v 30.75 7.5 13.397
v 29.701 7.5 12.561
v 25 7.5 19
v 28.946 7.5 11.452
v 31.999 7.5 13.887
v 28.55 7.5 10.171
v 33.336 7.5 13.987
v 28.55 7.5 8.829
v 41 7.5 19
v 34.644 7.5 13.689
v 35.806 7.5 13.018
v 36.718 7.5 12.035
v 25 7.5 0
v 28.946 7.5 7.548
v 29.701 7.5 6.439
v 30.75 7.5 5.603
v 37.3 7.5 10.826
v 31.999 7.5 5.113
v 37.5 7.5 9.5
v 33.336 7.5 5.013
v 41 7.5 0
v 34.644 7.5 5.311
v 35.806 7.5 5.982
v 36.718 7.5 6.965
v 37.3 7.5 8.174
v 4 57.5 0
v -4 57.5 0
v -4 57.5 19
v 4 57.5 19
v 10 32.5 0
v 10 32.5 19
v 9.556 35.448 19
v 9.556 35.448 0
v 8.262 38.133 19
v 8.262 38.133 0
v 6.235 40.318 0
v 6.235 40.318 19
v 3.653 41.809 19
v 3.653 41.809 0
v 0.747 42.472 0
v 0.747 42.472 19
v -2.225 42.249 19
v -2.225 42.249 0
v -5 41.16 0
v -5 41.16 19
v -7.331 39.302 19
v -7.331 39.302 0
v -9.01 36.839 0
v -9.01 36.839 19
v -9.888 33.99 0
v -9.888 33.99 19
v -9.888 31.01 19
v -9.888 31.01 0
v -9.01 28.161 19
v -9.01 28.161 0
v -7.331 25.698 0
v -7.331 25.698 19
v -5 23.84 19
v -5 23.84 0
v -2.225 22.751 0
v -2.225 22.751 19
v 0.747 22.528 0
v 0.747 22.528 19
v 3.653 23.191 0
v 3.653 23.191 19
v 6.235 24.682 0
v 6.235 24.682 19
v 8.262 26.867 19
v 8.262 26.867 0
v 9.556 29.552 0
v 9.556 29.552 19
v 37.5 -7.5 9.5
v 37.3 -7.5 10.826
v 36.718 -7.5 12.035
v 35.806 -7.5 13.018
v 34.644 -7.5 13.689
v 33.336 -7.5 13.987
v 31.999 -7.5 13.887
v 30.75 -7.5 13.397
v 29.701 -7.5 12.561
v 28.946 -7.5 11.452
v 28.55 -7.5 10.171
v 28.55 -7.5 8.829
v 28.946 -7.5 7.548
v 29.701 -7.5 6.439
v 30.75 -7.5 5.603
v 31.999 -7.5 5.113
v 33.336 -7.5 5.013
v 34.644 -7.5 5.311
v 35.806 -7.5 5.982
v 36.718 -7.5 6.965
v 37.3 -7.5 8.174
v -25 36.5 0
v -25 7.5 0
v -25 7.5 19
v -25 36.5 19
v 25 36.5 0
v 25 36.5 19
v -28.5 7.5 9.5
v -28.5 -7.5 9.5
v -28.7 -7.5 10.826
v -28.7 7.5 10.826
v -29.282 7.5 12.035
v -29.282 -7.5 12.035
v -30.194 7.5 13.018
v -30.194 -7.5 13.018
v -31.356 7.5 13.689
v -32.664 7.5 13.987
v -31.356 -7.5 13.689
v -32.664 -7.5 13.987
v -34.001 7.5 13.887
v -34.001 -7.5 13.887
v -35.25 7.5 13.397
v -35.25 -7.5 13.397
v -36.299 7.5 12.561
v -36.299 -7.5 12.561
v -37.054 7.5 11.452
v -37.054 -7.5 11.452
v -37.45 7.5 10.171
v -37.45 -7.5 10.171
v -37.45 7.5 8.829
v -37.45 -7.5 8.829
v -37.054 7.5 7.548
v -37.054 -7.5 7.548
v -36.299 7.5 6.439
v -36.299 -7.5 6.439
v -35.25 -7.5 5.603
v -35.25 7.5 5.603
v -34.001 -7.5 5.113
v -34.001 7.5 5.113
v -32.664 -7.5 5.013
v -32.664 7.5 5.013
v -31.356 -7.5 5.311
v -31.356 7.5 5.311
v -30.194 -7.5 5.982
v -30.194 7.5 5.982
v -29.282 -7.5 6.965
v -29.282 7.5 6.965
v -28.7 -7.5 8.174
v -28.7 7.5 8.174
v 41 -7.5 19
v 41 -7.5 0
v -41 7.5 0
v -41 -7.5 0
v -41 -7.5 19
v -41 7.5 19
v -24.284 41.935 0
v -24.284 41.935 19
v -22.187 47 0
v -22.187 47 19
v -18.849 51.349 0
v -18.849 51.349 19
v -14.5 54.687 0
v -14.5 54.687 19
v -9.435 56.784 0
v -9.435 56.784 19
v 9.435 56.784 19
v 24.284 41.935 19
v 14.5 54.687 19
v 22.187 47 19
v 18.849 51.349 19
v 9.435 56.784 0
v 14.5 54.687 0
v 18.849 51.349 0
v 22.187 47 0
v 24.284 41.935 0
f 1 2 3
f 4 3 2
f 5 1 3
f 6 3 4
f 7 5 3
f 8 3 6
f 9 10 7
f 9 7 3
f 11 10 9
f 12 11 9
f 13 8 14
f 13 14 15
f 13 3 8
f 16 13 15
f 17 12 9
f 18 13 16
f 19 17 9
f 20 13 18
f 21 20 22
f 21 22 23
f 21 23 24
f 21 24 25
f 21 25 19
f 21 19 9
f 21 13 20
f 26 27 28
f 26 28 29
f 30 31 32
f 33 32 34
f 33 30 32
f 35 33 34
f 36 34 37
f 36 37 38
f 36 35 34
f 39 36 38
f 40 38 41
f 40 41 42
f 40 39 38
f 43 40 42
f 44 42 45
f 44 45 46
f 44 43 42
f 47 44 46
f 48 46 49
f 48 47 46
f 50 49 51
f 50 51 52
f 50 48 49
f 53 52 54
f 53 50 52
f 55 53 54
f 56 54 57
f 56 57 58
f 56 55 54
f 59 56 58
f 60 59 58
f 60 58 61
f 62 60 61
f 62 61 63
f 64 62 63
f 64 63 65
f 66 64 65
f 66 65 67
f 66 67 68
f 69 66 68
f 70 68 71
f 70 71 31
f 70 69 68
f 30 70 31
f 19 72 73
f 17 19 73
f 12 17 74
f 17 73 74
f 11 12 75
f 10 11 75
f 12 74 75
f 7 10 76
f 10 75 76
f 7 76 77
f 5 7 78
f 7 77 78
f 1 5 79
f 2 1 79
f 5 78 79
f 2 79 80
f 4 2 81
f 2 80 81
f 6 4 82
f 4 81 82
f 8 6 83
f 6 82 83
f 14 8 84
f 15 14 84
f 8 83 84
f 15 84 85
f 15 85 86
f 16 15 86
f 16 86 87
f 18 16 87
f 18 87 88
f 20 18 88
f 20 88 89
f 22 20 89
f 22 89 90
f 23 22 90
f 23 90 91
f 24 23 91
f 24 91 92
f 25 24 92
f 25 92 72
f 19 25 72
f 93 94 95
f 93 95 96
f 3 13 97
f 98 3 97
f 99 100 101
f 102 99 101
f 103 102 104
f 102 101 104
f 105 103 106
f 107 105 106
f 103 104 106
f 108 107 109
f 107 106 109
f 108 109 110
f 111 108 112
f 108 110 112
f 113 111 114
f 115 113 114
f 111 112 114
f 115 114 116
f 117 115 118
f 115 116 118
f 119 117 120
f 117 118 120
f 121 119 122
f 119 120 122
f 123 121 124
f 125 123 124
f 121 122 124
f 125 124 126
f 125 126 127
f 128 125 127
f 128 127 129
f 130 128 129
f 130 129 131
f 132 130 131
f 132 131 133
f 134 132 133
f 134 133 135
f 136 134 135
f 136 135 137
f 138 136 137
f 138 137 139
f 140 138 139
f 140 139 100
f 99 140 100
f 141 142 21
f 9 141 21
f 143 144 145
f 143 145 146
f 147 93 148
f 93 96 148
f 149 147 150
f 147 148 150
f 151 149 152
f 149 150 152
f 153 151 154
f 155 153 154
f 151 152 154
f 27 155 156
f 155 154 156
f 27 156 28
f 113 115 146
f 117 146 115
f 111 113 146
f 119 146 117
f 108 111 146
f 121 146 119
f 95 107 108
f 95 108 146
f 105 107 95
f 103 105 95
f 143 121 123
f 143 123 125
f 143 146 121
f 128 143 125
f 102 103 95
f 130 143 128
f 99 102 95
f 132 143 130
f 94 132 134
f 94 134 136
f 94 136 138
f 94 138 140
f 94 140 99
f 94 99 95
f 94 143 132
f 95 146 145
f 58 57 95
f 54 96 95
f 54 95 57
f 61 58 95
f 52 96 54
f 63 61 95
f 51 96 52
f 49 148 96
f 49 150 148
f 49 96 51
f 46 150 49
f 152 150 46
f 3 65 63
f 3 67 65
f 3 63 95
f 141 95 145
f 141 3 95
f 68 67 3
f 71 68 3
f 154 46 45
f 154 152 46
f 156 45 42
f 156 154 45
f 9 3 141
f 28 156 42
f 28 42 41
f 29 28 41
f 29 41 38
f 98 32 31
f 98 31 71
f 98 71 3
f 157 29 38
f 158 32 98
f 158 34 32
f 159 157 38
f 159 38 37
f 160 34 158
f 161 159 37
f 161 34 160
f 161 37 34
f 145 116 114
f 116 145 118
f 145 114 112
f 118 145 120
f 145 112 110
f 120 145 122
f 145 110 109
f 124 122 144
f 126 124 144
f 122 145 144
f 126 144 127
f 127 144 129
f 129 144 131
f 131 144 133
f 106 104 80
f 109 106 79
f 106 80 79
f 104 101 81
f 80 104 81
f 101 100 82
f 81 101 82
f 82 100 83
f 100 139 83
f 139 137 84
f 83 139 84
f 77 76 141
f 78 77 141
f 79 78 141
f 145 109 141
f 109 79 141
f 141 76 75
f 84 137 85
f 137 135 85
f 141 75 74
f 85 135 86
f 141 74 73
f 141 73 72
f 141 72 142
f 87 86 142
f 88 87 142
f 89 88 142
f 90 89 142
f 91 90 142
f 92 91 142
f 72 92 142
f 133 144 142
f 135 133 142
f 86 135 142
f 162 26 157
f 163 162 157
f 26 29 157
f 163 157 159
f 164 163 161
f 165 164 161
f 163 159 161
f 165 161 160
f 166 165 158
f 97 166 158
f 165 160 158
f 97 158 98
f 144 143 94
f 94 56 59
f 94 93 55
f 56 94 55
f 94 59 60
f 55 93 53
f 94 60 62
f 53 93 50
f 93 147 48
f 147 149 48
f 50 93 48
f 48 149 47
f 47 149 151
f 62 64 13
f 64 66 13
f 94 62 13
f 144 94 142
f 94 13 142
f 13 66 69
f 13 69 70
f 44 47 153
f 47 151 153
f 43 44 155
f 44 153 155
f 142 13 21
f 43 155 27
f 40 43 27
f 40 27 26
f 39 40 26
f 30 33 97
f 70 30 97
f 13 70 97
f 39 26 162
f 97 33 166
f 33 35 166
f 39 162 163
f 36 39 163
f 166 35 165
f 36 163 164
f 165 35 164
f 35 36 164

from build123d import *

# Parameters (mm, degrees)
SKETCH_1_W          = 50
SKETCH_1_H          = 50
SKETCH_1_R          = 10
SKETCH_1_W_2        = 82
SKETCH_1_H_2        = 15
EXTRUDE_1_DEPTH     = 19
FILLET_1_R          = 21
FILLET_3_R          = 21
SKETCH_2_R          = 4.5
CUT_EXTRUDE_1_DEPTH = 19


with BuildPart() as part:
    # 草图1 → 凸台-拉伸1 (new body)
    with BuildSketch(Plane.XY):
        with Locations((0, 32.5)):
            Rectangle(SKETCH_1_W, SKETCH_1_H)
        with Locations((0, 32.5)):
            Circle(SKETCH_1_R, mode=Mode.SUBTRACT)
        Rectangle(SKETCH_1_W_2, SKETCH_1_H_2)
    extrude(amount=EXTRUDE_1_DEPTH)

    # 圆角1
    fillet_1_edges = [part.edges().sort_by_distance(p)[0] for p in [
        (-25, 57.5, 9.5),
    ]]
    fillet(fillet_1_edges, radius=FILLET_1_R)

    # 圆角3
    fillet_3_edges = [part.edges().sort_by_distance(p)[0] for p in [
        (25, 57.5, 9.5),
    ]]
    fillet(fillet_3_edges, radius=FILLET_3_R)

    # 草图2 → 切除-拉伸1 (cut)
    with BuildSketch(Plane.XZ.offset(7.5)):
        with Locations((-33, 9.5)):
            Circle(SKETCH_2_R)
        with Locations((33, 9.5)):
            Circle(SKETCH_2_R)
    extrude(amount=-CUT_EXTRUDE_1_DEPTH, mode=Mode.SUBTRACT)


solid = part.part
